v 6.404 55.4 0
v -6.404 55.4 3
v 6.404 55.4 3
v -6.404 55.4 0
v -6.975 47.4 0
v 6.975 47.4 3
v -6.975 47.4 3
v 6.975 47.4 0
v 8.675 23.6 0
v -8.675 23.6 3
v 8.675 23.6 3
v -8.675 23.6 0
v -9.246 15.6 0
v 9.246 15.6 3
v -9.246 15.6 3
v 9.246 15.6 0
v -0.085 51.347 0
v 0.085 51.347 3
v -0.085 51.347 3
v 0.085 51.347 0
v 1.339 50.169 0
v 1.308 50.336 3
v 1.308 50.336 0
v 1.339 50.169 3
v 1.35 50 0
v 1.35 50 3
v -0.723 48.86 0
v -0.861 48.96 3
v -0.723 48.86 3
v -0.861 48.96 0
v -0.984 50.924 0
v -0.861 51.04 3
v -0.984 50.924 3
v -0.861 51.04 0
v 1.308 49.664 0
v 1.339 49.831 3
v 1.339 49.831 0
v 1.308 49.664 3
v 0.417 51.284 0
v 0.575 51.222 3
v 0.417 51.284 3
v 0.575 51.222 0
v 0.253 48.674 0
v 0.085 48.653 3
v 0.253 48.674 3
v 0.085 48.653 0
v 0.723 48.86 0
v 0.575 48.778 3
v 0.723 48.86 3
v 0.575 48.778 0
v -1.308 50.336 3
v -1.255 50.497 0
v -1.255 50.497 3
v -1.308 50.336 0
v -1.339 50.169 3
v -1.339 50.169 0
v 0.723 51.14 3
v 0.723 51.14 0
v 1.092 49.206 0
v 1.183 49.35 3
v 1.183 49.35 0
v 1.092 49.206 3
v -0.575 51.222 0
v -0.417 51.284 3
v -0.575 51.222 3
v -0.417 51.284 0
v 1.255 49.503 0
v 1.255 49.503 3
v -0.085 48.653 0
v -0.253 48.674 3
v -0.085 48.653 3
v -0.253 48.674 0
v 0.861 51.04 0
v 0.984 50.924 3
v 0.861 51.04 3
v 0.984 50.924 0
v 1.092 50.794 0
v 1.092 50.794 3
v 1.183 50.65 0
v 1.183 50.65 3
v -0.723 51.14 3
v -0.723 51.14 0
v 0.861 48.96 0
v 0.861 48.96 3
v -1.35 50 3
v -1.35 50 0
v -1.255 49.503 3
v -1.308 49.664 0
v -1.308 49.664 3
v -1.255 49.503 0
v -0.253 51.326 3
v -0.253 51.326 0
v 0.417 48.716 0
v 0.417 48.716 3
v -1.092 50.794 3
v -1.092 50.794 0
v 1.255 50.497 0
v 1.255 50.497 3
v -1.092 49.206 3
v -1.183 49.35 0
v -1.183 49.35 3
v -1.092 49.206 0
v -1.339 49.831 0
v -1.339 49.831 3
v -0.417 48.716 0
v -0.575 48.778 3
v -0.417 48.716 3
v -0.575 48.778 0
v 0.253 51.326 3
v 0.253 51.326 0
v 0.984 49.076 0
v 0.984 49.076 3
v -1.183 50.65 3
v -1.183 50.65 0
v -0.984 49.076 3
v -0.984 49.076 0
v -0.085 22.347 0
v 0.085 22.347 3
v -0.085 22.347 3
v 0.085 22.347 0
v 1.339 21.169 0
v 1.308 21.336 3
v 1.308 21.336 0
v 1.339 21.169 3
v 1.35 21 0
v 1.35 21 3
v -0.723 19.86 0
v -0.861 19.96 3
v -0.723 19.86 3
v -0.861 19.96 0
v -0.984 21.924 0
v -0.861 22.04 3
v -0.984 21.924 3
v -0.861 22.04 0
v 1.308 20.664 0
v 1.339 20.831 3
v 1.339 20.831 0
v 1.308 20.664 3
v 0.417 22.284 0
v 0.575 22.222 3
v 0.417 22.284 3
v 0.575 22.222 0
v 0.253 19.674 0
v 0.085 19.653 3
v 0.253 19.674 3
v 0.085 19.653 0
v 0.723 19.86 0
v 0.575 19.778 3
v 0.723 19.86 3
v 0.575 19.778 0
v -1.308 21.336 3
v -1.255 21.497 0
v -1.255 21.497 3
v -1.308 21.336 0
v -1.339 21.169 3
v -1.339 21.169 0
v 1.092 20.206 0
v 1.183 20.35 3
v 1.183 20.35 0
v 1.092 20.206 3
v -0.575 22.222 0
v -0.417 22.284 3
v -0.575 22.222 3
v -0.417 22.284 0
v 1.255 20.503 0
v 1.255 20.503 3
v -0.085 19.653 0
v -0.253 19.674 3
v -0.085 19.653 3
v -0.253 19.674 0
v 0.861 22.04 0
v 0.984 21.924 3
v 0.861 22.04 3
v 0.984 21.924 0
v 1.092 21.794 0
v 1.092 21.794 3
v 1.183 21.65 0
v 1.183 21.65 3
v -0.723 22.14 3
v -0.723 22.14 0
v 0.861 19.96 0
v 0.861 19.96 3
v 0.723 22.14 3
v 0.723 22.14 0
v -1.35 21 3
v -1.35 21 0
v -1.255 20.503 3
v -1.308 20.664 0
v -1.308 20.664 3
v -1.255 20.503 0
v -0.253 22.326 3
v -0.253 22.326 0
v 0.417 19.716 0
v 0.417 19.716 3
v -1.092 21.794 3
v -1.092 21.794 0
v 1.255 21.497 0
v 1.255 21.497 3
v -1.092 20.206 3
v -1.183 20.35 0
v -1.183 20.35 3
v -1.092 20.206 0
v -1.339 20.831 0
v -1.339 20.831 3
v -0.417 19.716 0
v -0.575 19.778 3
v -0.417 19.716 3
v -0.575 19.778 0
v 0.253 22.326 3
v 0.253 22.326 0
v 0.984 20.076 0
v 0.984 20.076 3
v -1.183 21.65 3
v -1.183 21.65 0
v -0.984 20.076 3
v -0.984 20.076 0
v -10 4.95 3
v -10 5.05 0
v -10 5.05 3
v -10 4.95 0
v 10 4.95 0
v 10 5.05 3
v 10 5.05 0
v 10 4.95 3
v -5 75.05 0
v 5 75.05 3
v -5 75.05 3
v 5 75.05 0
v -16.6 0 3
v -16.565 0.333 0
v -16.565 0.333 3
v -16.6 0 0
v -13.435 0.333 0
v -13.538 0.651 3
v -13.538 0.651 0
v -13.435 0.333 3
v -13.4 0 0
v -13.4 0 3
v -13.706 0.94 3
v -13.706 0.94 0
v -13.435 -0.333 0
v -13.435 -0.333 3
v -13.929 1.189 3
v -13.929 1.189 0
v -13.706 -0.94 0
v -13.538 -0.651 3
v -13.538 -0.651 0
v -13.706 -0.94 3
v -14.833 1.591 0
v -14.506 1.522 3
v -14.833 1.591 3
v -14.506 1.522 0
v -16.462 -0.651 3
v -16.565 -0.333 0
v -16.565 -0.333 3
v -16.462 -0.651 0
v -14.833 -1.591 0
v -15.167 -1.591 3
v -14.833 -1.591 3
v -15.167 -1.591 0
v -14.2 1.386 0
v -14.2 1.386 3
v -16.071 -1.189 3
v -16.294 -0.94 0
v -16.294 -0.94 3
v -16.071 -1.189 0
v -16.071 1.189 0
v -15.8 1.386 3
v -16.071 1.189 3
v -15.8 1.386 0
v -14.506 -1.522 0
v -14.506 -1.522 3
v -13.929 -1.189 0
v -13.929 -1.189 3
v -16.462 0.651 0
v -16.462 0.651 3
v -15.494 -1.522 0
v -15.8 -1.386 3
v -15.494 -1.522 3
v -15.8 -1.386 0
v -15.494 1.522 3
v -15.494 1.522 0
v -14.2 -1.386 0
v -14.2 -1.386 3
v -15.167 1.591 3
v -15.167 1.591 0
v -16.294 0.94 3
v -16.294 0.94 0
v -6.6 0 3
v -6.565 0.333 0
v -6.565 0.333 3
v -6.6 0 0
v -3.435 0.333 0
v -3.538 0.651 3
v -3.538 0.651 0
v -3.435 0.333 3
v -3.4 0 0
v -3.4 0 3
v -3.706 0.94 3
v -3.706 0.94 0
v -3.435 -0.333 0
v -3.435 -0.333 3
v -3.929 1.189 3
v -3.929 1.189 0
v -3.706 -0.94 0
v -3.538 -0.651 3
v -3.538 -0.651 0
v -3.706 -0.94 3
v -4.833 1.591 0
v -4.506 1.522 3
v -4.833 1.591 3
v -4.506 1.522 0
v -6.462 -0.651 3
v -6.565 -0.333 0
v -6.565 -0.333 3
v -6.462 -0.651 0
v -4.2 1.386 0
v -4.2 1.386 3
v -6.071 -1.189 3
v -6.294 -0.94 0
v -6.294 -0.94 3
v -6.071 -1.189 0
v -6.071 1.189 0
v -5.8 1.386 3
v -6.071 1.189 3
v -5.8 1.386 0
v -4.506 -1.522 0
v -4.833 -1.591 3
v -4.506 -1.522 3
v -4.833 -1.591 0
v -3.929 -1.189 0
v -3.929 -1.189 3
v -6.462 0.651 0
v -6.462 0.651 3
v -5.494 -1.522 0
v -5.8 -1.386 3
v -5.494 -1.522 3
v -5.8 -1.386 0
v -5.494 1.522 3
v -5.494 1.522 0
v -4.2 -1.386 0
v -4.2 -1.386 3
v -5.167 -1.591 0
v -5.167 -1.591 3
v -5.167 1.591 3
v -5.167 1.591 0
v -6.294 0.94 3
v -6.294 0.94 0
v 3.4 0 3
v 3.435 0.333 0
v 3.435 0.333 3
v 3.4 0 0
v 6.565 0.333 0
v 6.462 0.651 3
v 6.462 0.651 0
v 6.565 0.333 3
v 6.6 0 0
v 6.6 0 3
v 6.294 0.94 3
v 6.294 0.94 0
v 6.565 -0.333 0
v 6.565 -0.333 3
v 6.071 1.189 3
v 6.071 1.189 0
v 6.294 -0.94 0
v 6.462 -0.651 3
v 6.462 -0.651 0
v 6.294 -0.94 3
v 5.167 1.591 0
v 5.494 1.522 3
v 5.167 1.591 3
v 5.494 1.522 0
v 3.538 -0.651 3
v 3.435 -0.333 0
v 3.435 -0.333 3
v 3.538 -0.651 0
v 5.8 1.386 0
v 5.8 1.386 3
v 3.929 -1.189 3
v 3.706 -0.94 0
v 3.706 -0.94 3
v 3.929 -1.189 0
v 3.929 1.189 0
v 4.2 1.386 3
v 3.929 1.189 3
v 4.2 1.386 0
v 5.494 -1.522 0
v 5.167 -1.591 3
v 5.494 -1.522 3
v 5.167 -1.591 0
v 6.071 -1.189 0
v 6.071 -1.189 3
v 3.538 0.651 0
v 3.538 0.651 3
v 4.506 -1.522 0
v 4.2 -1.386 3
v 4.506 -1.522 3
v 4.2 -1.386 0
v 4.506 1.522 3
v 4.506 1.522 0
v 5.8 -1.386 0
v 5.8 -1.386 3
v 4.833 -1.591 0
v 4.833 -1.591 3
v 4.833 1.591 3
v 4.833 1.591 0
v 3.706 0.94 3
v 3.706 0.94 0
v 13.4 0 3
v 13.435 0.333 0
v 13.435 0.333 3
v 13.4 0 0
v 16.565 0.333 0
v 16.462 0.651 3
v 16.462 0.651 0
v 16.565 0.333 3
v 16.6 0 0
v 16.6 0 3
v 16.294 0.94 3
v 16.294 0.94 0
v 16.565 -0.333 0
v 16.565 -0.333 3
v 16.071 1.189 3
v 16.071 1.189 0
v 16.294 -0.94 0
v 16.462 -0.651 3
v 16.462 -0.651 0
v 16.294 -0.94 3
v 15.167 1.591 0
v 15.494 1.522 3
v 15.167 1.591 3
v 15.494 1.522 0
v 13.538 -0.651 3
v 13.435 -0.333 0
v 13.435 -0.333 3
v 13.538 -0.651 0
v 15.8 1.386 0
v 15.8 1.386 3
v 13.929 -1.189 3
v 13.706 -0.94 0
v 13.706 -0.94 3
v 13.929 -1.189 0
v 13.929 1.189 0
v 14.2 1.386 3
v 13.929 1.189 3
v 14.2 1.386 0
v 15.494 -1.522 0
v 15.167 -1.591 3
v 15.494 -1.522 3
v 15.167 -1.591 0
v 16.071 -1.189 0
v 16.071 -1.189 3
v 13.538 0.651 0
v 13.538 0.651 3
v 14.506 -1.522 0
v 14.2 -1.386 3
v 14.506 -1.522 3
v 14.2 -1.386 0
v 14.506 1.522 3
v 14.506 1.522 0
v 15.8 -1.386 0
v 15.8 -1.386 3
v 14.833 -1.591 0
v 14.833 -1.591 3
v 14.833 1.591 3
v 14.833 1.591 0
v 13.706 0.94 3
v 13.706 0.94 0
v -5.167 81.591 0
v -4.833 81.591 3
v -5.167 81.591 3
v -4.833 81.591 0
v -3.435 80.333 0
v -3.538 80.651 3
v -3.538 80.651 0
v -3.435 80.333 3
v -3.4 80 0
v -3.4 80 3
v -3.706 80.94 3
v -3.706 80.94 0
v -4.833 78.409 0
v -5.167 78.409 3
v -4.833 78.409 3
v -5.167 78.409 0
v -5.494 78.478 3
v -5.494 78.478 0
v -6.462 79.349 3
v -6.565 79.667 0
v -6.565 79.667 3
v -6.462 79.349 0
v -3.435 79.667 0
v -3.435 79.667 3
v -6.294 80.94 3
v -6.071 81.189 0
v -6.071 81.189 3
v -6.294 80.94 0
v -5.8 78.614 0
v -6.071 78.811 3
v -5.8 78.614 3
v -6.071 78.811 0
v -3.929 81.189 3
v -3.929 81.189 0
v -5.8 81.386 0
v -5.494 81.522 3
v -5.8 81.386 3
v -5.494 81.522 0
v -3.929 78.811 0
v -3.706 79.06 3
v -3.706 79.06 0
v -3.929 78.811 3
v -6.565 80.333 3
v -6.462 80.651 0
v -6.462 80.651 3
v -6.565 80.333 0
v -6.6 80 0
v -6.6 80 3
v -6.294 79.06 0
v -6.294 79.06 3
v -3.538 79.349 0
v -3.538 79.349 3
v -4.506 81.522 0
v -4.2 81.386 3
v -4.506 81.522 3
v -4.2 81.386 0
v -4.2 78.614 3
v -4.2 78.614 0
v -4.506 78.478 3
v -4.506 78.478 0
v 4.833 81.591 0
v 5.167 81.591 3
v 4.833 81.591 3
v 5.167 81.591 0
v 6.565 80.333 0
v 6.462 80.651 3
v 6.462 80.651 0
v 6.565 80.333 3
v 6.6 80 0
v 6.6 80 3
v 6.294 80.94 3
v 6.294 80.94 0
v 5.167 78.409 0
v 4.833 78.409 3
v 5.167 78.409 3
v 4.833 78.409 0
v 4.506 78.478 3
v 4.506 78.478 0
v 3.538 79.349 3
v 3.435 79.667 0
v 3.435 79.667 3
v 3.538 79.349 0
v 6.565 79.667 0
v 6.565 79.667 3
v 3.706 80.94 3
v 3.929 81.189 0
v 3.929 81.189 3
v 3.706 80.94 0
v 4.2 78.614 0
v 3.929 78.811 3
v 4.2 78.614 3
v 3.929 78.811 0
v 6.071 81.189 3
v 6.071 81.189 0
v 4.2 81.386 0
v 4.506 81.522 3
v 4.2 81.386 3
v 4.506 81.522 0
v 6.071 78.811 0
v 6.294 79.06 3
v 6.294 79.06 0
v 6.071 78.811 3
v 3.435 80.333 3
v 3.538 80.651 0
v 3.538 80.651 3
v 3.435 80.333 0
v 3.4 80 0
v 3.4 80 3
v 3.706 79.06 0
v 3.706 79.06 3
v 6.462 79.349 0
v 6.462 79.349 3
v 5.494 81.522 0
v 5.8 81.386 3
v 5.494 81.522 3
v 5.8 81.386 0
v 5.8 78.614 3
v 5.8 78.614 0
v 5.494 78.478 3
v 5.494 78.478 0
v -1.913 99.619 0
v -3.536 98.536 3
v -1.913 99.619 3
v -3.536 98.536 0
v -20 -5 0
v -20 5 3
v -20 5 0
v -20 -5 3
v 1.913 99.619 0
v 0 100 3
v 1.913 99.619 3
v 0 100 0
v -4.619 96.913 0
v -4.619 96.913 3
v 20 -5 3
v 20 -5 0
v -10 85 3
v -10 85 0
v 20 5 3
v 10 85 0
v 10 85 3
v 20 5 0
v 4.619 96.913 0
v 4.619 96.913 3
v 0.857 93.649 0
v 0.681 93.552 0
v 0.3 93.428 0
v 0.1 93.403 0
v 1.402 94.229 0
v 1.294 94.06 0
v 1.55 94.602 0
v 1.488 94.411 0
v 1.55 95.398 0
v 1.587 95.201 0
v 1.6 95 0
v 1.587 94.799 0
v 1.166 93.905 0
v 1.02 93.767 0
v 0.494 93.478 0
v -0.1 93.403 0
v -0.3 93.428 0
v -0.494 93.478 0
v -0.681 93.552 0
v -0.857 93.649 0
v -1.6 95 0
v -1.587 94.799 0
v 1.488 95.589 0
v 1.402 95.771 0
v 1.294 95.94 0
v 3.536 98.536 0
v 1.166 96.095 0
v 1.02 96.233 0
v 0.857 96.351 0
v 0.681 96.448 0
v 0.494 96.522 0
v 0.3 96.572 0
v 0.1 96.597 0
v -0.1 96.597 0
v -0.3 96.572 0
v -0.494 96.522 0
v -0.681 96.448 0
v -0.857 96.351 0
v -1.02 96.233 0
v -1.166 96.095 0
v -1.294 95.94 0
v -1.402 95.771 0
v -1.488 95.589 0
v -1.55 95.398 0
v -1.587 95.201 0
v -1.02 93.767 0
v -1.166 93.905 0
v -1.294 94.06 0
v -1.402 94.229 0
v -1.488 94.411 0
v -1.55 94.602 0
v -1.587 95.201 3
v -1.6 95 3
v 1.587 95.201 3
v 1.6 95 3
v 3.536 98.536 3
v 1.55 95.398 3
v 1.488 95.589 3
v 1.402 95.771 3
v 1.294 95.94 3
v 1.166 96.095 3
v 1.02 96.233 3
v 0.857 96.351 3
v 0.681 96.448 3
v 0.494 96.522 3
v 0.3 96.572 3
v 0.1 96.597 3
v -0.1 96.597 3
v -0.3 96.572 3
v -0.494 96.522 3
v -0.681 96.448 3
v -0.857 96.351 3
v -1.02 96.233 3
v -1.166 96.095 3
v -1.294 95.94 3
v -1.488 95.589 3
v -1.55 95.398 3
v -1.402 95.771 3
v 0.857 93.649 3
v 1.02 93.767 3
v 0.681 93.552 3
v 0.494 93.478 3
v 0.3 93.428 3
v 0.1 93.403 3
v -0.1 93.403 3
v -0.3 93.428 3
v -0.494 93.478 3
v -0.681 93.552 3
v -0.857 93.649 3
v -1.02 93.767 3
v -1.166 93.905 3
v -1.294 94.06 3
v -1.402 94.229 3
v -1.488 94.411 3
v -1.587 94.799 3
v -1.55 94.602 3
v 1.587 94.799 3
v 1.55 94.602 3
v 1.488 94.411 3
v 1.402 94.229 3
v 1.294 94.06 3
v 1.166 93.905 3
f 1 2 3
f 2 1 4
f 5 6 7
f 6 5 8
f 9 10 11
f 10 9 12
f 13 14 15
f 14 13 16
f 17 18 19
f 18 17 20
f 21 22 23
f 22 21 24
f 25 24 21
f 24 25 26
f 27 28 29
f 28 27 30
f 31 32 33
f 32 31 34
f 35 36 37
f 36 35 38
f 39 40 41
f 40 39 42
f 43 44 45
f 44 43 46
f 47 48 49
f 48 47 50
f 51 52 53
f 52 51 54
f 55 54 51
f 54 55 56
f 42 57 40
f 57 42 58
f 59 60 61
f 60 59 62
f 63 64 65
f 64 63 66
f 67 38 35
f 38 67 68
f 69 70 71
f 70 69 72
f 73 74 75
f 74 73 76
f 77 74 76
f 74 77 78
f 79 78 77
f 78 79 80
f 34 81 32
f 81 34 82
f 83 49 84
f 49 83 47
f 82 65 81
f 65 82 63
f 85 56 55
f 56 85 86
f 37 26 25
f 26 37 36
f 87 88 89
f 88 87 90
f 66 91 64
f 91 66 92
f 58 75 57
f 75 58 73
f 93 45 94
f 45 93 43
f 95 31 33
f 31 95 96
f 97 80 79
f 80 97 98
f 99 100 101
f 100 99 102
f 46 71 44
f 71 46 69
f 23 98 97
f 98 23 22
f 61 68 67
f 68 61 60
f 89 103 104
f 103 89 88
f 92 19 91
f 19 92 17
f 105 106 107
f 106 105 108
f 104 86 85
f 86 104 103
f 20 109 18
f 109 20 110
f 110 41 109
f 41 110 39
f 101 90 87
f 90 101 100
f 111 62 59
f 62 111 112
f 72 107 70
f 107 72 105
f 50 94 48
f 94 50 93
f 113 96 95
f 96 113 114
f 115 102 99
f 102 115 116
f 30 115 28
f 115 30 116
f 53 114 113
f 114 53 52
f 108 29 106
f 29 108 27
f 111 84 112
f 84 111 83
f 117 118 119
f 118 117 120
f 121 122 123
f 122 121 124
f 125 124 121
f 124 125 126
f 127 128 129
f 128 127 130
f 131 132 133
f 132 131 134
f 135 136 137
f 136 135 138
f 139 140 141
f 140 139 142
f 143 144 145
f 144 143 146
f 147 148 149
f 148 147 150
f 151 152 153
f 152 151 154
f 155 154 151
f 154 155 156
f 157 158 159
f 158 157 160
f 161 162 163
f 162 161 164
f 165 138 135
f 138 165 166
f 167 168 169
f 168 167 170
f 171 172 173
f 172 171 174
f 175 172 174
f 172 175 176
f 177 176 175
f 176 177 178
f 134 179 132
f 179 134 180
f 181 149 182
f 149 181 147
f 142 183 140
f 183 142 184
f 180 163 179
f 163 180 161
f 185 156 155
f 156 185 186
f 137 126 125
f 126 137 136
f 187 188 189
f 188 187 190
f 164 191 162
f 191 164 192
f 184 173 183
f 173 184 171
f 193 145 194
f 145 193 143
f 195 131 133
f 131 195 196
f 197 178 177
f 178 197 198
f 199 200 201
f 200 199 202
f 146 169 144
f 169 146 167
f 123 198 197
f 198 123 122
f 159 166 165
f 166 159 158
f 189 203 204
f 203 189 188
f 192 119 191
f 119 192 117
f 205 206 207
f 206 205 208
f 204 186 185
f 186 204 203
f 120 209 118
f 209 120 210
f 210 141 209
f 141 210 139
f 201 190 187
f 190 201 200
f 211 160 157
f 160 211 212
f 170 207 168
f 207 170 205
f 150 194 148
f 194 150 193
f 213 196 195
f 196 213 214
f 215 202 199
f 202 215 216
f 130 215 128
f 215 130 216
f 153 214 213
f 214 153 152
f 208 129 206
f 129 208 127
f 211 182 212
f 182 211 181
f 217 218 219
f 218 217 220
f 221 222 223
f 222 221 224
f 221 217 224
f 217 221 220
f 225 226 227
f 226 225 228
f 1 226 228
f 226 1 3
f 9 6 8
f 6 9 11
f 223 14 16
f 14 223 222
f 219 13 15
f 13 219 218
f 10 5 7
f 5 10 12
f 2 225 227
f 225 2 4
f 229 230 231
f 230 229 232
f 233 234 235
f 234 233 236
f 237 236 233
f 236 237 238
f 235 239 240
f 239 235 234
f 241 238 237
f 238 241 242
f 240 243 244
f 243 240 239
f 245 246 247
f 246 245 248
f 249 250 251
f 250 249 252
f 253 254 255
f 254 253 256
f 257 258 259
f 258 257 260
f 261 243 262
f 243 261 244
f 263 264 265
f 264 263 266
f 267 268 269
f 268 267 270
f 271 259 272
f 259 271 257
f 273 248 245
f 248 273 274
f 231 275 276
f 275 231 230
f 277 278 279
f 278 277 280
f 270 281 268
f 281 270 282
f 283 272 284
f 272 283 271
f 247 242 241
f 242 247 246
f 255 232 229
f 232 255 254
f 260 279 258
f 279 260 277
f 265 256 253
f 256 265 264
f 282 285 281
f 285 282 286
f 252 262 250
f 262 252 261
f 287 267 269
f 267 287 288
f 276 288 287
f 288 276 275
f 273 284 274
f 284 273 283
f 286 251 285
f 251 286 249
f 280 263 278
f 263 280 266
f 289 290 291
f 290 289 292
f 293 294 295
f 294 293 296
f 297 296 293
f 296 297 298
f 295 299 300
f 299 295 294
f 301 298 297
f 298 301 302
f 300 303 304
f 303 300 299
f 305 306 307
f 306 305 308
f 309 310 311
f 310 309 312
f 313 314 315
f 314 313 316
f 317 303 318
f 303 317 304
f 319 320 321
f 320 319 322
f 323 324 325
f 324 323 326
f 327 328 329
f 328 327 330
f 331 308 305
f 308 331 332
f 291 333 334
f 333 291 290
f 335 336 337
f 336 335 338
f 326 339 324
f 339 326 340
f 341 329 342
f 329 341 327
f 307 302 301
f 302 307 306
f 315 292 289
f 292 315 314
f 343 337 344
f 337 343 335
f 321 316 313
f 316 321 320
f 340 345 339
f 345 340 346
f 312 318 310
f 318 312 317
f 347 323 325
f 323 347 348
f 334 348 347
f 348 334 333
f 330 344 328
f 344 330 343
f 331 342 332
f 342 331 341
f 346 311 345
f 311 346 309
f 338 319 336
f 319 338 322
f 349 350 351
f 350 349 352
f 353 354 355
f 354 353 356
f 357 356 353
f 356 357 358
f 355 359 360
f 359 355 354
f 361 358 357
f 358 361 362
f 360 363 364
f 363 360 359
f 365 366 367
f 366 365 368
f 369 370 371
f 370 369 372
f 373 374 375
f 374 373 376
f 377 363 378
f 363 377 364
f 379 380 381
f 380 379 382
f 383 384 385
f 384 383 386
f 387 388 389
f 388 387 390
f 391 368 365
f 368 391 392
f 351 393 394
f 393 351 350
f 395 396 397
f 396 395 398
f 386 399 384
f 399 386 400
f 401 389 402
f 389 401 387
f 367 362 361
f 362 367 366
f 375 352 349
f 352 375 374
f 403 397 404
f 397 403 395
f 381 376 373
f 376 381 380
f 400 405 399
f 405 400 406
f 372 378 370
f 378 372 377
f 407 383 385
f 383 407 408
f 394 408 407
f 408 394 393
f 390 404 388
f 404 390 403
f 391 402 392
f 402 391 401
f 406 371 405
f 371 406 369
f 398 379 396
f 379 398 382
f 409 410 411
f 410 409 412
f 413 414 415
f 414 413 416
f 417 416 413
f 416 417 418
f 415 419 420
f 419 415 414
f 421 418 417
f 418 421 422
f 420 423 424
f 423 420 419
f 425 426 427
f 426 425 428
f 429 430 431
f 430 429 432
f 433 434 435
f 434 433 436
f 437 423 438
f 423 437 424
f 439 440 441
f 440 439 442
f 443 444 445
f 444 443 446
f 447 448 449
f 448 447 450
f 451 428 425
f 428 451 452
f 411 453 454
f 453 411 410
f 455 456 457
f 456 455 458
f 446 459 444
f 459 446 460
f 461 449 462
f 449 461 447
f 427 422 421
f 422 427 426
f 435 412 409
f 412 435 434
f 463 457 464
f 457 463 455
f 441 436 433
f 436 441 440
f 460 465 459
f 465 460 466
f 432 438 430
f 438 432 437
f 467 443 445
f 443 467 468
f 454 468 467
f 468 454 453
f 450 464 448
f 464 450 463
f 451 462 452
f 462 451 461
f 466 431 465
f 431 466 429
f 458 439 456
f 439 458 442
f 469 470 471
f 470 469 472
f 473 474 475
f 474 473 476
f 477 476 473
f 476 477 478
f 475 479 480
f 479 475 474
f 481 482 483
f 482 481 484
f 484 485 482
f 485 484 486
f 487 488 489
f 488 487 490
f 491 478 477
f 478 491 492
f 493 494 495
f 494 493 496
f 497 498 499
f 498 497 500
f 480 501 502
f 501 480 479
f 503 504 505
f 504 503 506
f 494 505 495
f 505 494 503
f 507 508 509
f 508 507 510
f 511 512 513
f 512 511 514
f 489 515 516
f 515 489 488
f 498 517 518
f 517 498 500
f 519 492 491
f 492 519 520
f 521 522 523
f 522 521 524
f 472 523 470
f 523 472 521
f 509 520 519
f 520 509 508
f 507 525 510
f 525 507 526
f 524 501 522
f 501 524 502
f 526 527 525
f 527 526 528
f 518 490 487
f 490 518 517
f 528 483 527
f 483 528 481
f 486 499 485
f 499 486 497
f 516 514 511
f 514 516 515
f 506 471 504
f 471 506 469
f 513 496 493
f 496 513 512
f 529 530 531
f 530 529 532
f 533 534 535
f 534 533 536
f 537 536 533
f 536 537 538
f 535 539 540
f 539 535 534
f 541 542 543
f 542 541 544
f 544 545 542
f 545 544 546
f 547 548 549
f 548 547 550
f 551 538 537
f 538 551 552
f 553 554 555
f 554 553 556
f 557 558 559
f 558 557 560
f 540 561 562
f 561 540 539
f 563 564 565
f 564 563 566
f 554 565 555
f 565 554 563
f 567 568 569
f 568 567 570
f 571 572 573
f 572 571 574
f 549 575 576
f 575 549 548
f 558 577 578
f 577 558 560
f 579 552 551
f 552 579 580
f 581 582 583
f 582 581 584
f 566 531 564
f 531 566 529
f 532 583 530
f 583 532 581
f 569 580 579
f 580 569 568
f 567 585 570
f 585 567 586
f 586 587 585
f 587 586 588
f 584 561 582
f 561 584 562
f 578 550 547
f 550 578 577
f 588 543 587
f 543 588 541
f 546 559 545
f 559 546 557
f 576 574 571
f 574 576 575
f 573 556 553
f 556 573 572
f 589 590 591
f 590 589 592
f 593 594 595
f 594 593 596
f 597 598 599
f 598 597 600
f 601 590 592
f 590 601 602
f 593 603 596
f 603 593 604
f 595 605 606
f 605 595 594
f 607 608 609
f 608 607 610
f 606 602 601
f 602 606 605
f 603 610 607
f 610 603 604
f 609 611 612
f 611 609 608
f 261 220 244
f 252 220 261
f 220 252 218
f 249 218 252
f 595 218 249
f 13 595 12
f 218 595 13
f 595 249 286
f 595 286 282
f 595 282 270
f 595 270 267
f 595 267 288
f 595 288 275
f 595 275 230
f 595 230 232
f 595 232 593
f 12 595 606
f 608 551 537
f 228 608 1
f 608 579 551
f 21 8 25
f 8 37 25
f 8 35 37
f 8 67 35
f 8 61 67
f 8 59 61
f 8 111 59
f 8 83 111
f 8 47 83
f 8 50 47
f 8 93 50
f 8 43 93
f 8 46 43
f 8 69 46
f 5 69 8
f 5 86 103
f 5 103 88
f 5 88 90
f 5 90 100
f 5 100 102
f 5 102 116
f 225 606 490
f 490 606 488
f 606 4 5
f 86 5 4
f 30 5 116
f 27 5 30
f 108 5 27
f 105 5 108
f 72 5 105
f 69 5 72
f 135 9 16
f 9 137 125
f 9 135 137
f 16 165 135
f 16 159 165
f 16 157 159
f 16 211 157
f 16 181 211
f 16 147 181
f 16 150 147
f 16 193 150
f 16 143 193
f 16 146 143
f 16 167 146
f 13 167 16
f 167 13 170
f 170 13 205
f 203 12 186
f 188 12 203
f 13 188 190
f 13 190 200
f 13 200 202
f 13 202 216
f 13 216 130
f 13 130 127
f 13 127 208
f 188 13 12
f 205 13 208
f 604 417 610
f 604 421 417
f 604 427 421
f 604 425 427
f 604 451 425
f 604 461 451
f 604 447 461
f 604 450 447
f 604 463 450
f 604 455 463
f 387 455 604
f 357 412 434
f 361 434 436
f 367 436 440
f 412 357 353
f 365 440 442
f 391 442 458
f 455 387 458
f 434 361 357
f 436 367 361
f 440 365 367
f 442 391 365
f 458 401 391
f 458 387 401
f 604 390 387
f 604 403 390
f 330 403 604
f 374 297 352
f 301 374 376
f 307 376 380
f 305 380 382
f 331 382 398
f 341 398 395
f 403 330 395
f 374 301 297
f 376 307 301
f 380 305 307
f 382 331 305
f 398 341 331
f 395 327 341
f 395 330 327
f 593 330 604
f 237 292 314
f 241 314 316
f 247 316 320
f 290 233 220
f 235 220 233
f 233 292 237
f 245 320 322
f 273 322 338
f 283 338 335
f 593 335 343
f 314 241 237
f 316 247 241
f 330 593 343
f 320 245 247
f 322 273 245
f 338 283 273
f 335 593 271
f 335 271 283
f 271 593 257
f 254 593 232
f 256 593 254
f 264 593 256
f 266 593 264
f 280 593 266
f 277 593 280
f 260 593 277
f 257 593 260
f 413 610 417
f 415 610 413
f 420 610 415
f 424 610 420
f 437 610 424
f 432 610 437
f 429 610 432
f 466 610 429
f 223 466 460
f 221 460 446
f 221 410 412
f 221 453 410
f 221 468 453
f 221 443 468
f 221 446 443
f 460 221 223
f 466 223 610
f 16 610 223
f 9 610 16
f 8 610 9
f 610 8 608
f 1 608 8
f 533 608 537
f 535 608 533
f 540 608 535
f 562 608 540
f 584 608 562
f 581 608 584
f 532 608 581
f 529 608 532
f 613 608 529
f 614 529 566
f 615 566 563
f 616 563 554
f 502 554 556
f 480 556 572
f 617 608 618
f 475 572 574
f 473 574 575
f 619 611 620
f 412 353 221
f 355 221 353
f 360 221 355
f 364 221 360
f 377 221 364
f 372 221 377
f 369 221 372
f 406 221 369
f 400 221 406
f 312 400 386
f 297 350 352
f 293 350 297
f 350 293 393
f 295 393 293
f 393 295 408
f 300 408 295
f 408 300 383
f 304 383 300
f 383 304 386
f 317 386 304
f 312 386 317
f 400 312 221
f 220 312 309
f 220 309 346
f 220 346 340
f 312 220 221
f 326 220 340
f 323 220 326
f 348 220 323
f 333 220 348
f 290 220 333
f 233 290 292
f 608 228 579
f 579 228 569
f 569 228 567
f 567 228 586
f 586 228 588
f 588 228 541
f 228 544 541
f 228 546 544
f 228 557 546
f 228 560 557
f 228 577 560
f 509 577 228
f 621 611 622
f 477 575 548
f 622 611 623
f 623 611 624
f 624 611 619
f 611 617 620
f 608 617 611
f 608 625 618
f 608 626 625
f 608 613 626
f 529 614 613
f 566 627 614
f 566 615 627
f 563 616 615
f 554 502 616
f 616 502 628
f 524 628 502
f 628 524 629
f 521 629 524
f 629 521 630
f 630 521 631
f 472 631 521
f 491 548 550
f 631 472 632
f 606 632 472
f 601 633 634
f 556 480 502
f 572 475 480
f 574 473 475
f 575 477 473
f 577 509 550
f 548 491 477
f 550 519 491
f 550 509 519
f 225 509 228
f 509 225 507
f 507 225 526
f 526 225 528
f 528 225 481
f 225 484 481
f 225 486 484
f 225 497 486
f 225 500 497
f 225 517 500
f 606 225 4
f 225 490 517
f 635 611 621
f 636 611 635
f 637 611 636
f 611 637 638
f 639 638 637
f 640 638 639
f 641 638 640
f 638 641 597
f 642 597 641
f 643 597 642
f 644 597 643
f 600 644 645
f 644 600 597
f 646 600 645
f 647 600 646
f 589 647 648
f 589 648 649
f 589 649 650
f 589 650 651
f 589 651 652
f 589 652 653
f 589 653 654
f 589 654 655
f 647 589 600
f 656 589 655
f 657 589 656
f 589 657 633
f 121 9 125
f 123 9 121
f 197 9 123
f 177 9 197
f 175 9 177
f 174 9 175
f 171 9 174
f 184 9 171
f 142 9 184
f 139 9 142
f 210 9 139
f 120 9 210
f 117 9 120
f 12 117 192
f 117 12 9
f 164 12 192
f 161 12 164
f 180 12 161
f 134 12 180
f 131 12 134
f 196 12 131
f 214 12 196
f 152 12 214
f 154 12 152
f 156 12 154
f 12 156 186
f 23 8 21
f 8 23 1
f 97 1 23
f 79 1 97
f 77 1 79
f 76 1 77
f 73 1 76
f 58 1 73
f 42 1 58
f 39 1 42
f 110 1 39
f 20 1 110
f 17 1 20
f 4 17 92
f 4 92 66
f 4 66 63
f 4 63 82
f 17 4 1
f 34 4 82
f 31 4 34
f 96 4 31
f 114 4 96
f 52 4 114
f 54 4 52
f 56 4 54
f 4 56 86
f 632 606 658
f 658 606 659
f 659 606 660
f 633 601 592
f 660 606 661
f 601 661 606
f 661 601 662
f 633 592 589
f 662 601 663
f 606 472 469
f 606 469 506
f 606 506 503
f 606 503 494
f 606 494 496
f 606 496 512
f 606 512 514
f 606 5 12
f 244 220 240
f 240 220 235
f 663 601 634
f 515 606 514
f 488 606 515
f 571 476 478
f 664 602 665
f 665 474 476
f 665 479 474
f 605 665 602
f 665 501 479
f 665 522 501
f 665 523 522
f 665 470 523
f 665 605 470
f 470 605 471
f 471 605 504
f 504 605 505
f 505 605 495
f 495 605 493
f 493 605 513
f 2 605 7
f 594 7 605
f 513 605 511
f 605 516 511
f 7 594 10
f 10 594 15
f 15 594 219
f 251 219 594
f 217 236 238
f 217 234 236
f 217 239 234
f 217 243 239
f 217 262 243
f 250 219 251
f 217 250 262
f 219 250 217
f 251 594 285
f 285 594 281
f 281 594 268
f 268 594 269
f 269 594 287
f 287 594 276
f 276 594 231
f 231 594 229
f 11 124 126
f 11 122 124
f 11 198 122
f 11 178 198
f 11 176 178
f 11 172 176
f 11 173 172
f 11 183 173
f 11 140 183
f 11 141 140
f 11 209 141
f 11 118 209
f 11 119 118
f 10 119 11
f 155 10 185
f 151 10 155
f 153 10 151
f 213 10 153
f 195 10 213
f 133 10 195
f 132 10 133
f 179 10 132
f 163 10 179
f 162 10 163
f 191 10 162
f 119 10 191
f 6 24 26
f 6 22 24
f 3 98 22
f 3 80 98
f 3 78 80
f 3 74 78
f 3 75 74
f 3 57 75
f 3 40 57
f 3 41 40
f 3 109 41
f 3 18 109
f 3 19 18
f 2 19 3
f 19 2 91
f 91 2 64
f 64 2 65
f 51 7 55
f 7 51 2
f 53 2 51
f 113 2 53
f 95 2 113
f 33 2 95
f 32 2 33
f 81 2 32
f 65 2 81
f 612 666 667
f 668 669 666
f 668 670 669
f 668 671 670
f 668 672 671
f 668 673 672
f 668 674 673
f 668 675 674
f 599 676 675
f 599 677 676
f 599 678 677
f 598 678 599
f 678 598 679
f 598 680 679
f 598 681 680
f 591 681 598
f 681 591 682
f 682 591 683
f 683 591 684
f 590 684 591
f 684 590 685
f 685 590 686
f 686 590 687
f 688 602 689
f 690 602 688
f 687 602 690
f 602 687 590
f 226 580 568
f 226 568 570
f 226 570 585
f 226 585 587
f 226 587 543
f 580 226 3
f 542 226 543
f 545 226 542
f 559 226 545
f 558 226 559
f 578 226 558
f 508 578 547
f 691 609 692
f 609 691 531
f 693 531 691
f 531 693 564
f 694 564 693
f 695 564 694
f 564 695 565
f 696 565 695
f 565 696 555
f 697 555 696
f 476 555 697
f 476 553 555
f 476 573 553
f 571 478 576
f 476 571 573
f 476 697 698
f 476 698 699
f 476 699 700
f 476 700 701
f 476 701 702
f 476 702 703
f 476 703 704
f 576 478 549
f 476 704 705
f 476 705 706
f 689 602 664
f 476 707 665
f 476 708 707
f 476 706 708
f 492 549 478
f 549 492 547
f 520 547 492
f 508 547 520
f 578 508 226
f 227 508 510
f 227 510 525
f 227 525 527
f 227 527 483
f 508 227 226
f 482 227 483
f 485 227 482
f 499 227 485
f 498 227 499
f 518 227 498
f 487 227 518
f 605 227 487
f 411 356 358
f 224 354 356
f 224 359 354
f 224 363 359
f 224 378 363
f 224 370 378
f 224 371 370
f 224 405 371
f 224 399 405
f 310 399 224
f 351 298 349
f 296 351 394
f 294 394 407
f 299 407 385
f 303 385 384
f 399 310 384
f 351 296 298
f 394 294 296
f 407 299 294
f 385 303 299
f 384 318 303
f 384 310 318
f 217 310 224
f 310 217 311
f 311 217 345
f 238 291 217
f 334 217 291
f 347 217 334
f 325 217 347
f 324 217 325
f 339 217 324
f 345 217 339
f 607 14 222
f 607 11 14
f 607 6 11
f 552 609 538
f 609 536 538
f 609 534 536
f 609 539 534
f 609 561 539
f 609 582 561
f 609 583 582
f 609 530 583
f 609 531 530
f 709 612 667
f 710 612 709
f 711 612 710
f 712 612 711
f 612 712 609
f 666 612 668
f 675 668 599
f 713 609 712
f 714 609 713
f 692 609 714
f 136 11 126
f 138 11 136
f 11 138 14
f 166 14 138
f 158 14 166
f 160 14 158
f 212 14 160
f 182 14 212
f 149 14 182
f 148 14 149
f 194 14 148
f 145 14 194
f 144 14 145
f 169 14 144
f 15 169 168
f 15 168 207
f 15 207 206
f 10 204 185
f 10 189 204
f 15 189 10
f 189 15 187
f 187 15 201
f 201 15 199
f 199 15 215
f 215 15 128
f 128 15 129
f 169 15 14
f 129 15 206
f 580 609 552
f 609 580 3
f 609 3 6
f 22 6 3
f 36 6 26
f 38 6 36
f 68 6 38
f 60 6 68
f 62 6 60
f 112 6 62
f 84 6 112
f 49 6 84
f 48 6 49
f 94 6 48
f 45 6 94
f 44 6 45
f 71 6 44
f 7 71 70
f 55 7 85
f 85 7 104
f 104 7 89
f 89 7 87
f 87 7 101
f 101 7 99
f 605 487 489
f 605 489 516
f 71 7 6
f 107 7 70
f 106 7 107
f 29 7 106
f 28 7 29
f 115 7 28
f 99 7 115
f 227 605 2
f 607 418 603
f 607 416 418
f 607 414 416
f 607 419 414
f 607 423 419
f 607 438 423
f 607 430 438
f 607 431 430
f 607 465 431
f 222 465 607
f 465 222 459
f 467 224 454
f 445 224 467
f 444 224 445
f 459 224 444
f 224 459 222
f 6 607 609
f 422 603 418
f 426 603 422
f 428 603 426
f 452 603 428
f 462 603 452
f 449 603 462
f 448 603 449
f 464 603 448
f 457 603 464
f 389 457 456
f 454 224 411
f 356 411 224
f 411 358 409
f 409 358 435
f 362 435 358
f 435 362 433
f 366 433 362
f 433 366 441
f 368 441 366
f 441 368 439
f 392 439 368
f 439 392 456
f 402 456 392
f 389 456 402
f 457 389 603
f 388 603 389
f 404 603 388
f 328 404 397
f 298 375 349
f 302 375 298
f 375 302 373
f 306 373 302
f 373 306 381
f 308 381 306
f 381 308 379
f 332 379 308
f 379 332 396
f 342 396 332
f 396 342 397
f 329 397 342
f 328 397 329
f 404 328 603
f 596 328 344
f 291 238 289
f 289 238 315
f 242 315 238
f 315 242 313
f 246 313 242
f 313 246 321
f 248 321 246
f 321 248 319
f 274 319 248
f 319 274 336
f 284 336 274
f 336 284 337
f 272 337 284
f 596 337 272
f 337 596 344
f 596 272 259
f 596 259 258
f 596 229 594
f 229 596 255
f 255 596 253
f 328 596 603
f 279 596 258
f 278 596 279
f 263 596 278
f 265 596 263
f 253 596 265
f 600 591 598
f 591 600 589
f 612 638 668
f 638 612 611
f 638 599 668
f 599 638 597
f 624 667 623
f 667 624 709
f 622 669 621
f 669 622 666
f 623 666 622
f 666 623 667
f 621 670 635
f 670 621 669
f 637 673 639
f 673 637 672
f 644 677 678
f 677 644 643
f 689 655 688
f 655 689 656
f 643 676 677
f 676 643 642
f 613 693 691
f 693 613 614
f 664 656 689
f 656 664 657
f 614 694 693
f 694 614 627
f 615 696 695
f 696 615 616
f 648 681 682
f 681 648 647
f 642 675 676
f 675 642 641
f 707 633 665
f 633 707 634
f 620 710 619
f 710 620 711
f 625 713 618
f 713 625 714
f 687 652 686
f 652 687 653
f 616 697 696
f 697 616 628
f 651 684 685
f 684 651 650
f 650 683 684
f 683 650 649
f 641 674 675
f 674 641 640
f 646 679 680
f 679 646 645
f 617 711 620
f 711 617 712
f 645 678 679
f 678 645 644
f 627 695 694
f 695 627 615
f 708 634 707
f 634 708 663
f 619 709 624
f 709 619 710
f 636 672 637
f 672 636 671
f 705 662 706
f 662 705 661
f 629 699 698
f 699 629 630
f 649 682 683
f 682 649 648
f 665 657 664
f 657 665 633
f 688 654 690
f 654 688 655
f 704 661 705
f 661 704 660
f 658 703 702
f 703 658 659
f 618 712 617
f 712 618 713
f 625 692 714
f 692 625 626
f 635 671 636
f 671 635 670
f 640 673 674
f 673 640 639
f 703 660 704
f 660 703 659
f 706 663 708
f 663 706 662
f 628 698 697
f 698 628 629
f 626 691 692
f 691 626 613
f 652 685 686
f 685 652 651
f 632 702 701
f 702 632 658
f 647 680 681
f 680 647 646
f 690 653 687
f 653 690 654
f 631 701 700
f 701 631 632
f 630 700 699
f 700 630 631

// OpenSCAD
// file: ../parameters.scad
global_clearance = 0.5;

layer_thickness = 0.3;

//Main tube diameter - hole [mm]
main_tube_outer_diameter = 25.4;
main_tube_inner_diameter = 23.05;

// Nastavení parametrů rotoru

gliding_aggle = 14;         // tenhle úhel by se zřejmě v budoucnu měl počítat z požadované klouzavosti.

rotor_blade_AOA = 1.5;      // nastavení úhlu náběhu rotorového listu

// Rotor Auto-G2
rotor_blade_rod = true;  // generovat diru pro uhlikove tycky
rotor_blade_length = 400 - 15;   // délka rotorového listu
rotor_blade_depth = 45.5;     // hloubka rotorového listu


blade_mount_length = 30;

blade_mount_width = 17;
blade_mount_thickness = 4.6;
blade_mount_screw_offset = 5; // distance of first screw from rotor end

// Testovaci maly rotor

        /*
        rotor_blade_rod = false;
        rotor_blade_length = 145;   // délka rotorového listu
        rotor_blade_depth = 45.5 * (145/385);     // hloubka rotorového listu
        blade_mount_length = 20;
        blade_mount_width = 10;
        blade_mount_thickness = 4;
        */

// konec parametru pro testovaci maly rotor

rotor_height = 180;         // výška otočného kloubu rotoru nad hlavní trubkou vírníku (odhad)
rotor_blades_count = 2;
rotor_delta_angle = 12;
rotor_blade_thickness = 5.1;

rotor_blade_naca = 2412;
rotor_blade_parts_count = 3;

blade_transition_length = 10; // length of blade transition

blade_mount_screw_distance = (16.47+11.86)/2;

/* blade_shell_thickness = 0.4;
blade_shell_thickness_inner = 0.4;
blade_shell_thickness_wire = 0.4;
blade_infill_distance = 25;
blade_infill_overlap = 0; */

/// Nastaveni pro Slic3r
blade_shell_thickness = 0.45;
blade_shell_thickness_inner = 0.43;
blade_shell_thickness_wire = 0.45;
blade_infill_distance = 20;
blade_infill_overlap = 0;


//blade_rod_position = [rotor_blade_depth/4 + 5, 0, 0];
//blade_rod_position2 = [rotor_blade_depth/4 - 5, 0, 0];

//blade_rod_position = [15, 0, 0];
//blade_rod_position2 = [4, 0.3, 0];

blade_rod1_diameter = 2.58;
blade_rod2_diameter = 2.58;
blade_rod3_diameter = 2.13;

blade_rod1_position = [3.4, 0.3, 0];
blade_rod2_position = [rotor_blade_depth/4 - 4, 0.2, 0];
blade_rod3_position = [rotor_blade_depth/4 + 3.5, 0, 0];


rotor_head_width =  30;    //Rozměr 1 v nákresu
pilon_wall_thickness = 4.2;  // Rozměr 2 v nákresu
horizontal_screw_distance = 14.5;   // Rozměr 4 v nákresu
vertical_screw_distance = 12;       // rozměr 5 v nkresu
topscrew_distance_endofpilon = 5;

rotorhead_wall_thickness = 3; // sila tistenych dilu


bearing_outer_diameter = 10.2;    // Rozměr B1 v nákresu s přídavkem na toleranci otvoru
bearing_thickness = 4;        // Rozměr B2 v nákresu
//bearing_shaft_length = 19.5;    // Rozměr B3 v nákresu, Originalni hodnota 19.5
bearing_shaft_length = 20;    // Rozměr B3 v nákresu


// nastavení parametrů motoru

engine_angle = -8;
engine_diameter = 55;
engine_offset = 55;

engine_screws_radius = 15;
engine_holes_radius = (24 + 44)/4;
engine_shatf_hole_diameter = 13;

// screw length step - minimum difference in length between two types of screws
basic_screw_length = 5;

//Screw diameter and nut for M6 [mm]
M6_screw_diameter=6.5;
M6_head_diameter = 10+0.5;
M6_head_height = 6;
M6_nut_height = 4.9;
M6_nut_diameter = 11.8;
M6_nut_pocket = 10.4;

//Screw diameter and nut for M5 [mm]
M5_screw_diameter=5.5;
M5_head_height = 5;
M5_head_diameter = 13+0.5;
M5_nut_height = 4.5;
M5_nut_diameter = 9.4;
M5_nut_pocket = 8.4;

//Screw diameter and nut for M4 [mm]
M4_screw_diameter=4.5;
M4_screw_head_height = 4;
M4_nut_height = 3.2;
M4_nut_diameter = 8.4;
M4_nut_pocket = 7.5;

//Screw diameter and nut for M3 [mm]
M3_screw_diameter = 3.2;
M3_nut_height = 2.7;
M3_nut_diameter = 6.6;
M3_screw_head_height = 3;
M3_nut_pocket = 5.6;


//Screw diameter and nut for M2,5 [mm]
M2_5_screw_diameter = 2.7;
M2_5_nut_height = 2.3;
M2_5_nut_diameter = 6;
M2_5_nut_pocket = 5.1;

//Screw diameter and nut for M2 [mm]
M2_screw_diameter = 2.0;
M2_nut_height = 1.8;
M2_nut_diameter = 4.8;
M2_nut_pocket = 3.95;


blade_mount_screw = M2_screw_diameter;
blade_mount_nut = M2_nut_diameter;


//šroub servo
Servo_screw = 1.5;
Servo_nut_height = 1;
Servo_nut_diameter = 2.7;

tail_pipes_distance = 10.16*5;
tail_pipes_diameter = M4_screw_diameter;
tail_pipes_min_wall = 3;

//center_of_gravity_position = [main_pilon_position - tan(gliding_aggle)*rotor_height, 0, 0];


base_patern = 10.16;
////podzvozek

radius_undercarriage = 25;
vzdalenost_x = tan(20) * 131;
vzdalenost_y = (131 - radius_undercarriage)/tan(79);
uhel_y = 90 - 20;
uhel_x = 90 - 79;

maximum_printable_size = 150;


////Pitotova trubice
Pitot_tube_diameter = 4.02 + 1;
Distance_hole_from_tube = 11.92;  //vzdálenost otvoru pro připevnění od samotné trubičky


////Vlečné zařízení
tow_ring_diameter = 20;
tow_ring_thickness = 5;
tow_ring_groove = 2;
tow_ring_hole_diameter = M3_screw_diameter;

////Simoniny parametry pro nosník rotoru
base_length = 290; //delka podlozky
base_split_position = [0, 145, base_length];
base_width = 70; //sirka podlozky - vnější šířka nosníku
base_thickness = 4; //vyska podlozky
base_patern = 10;
rantl_thickness = 4; //sirka steny podlozky
rantl_height = 8;
niy=4; //pocet der podelne


// Drazak motoru

motor_holder_height = base_patern * 5;
motor_holder_thickness = 4;
motor_holder_motor_height = 25;
motor_holder_side_mount_height = base_patern*2.5;
pilon_holder_side_mount_height = base_patern*4;


// Paraetry pilonu


// pilon_height = 250 - pilon_holder_side_mount_height;
pilon_height = 230 - pilon_holder_side_mount_height;
pilot_height_separation = 150 - pilon_holder_side_mount_height;
pilon_thickness = 3;
pilon_beam_width = 10;
pilon_base_length = 60;
pilon_ring_length = 40;
pilon_ring_thickness = 3;

pilon_top_width = 20;
pilon_top_length = 20;

pilon_ring_width = 45;
pilon_ring_height_rantl = 12+0.5;
pilon_ring_height = 3;

pilon_angle = atan2(pilon_height,(base_width-pilon_top_width)/2);
echo(pilon_angle);

pilon_bottom_angle = atan2(pilot_height_separation,(base_width-pilon_ring_width)/2-pilon_thickness*1.5);
echo(pilon_bottom_angle);
pilon_top_angle = atan2(pilon_height - pilot_height_separation,(pilon_ring_width - rotor_head_width)/2 - pilon_thickness - pilon_ring_thickness);
echo(pilon_top_angle);
// main file
//@set_slicing_config(slicing/default.ini)
//Spodni cast pilonu

include <../parameters.scad>


module 888_1008(){
    translate([0, 0, pilon_thickness/2])
    difference(){
        union(){
            hull(){
                cube([pilon_ring_length, 10, pilon_thickness], center = true);
                translate([0, pilon_height - pilot_height_separation, 0])
                    cube([pilon_top_length, 10, pilon_thickness], center = true);
                translate([0, pilon_height - pilot_height_separation + 15, 0])
                    cylinder(d = 10, h=pilon_thickness, center = true);
            }
            /* hull(){
                cube([pilon_ring_length, 10, pilon_thickness], center = true);
                translate([0, 0, pilon_thickness/2])
                    rotate([90-pilon_angle, 0, 0])
                        cube([pilon_ring_length, 10, 0.1], center = true);
            }
    translate([0, pilot_height_separation, 0])
            hull(){
                cube([pilon_base_length/4, 10, pilon_thickness], center = true);
                translate([0, 0, pilon_thickness/2])
                    rotate([90-pilon_angle, 0, 0])
                        cube([pilon_base_length/2, 10, 0.1], center = true);
            } */
        }
        translate([0, pilon_height - pilot_height_separation + 15, 0])
            cylinder(d = M3_screw_diameter, h=pilon_thickness+1, center = true, $fn = 50);

        difference(){
            hull(){
                translate([0, 10/2, 0])
                    cube([pilon_ring_length-20, 0.1, pilon_thickness+1], center = true);
                    translate([0, pilon_height - pilot_height_separation - 10/2, 0])
                        cube([pilon_top_length-10, 0.1, pilon_thickness+1], center = true);
            }
                difference(){
                    union(){
                        translate([0, pilot_height_separation/2 - 8/2 + 0.4, 0])
                            cube([pilon_base_length/2, 8, pilon_thickness+1], center = true);

                        translate([0, pilot_height_separation/2 - 8*1.5 - 23 - 0.4, 0])
                            cube([pilon_base_length/2, 8, pilon_thickness+1], center = true);
                    }
                    translate([0, pilot_height_separation/2 - 8 + 3, 0])
                        cylinder(d = M2_5_screw_diameter, h = 10, $fn = 50, center = true);
                    translate([0, pilot_height_separation/2 - 8 - 23 - 3, 0])
                        cylinder(d = M2_5_screw_diameter, h = 10, $fn = 50, center = true);

                }
        }




    for(x = [-pilon_ring_length/2+5:10:pilon_ring_length/2-5])
    translate([x, 0, 0])
            cylinder(d = M3_screw_diameter, h = 20, center = true, $fn = $preview?10:30);

    for(x = [-pilon_top_length/2+5:10:pilon_top_length/2-5])
    translate([x, pilon_height - pilot_height_separation, 0])
            cylinder(d = M3_screw_diameter, h = 20, center = true, $fn = $preview?10:30);
    }
}

888_1008();
